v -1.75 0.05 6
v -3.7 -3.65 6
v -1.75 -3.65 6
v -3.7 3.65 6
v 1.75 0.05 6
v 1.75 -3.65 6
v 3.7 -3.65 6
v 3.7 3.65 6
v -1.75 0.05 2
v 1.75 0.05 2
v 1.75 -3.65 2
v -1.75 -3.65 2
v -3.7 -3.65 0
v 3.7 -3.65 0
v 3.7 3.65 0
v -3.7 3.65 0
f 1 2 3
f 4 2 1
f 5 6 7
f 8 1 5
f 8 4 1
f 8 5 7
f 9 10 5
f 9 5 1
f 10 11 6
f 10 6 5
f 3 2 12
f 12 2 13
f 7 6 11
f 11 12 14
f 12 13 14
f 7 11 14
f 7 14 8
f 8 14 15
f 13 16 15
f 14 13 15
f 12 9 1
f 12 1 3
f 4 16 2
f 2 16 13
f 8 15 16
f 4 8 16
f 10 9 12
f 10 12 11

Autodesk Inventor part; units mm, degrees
ref_plane "YZ Plane" through (0, 0, 0) normal (1, 0, 0) x (0, 1, 0)
ref_plane "XZ Plane" through (0, 0, 0) normal (0, 1, 0) x (-1, 0, 0)
ref_plane "XY Plane" through (0, 0, 0) normal (0, 0, 1) x (1, 0, 0)
sketch "Sketch1" plane through (0, 0, 0) normal (0, 0, 1) x (1, 0, 0)
  line L0 (-3.7, -3.65) -> (3.7, -3.65)
  line L1 (3.7, -3.65) -> (3.7, 3.65)
  line L2 (3.7, 3.65) -> (-3.7, 3.65)
  line L3 (-3.7, 3.65) -> (-3.7, -3.65)
  line L4 (-3.7, -3.65) -> (3.7, 3.65) construction
  line L5 (3.7, -3.65) -> (-3.7, 3.65) construction
  line L6 (-1.75, -3.65) -> (1.75, -3.65)
  line L7 (1.75, -3.65) -> (1.75, 0.05)
  line L8 (1.75, 0.05) -> (-1.75, 0.05)
  line L9 (-1.75, 0.05) -> (-1.75, -3.65)
  point P0 (0, 0)
  point P1 (0, 0.05)
  dimension "d0" = 7.4
  dimension "d1" = 7.3
  dimension "d2" = 3.5
  dimension "d3" = 3.7
extrude "Extrusion1" add sketch "Sketch1" along normal blind 6 contours L3 L2 L1 L0 L7 L8 L9
extrude "Extrusion2" add sketch "Sketch1" along normal blind 2 contours L9 L8 L7 L0
properties part number "Socket"
